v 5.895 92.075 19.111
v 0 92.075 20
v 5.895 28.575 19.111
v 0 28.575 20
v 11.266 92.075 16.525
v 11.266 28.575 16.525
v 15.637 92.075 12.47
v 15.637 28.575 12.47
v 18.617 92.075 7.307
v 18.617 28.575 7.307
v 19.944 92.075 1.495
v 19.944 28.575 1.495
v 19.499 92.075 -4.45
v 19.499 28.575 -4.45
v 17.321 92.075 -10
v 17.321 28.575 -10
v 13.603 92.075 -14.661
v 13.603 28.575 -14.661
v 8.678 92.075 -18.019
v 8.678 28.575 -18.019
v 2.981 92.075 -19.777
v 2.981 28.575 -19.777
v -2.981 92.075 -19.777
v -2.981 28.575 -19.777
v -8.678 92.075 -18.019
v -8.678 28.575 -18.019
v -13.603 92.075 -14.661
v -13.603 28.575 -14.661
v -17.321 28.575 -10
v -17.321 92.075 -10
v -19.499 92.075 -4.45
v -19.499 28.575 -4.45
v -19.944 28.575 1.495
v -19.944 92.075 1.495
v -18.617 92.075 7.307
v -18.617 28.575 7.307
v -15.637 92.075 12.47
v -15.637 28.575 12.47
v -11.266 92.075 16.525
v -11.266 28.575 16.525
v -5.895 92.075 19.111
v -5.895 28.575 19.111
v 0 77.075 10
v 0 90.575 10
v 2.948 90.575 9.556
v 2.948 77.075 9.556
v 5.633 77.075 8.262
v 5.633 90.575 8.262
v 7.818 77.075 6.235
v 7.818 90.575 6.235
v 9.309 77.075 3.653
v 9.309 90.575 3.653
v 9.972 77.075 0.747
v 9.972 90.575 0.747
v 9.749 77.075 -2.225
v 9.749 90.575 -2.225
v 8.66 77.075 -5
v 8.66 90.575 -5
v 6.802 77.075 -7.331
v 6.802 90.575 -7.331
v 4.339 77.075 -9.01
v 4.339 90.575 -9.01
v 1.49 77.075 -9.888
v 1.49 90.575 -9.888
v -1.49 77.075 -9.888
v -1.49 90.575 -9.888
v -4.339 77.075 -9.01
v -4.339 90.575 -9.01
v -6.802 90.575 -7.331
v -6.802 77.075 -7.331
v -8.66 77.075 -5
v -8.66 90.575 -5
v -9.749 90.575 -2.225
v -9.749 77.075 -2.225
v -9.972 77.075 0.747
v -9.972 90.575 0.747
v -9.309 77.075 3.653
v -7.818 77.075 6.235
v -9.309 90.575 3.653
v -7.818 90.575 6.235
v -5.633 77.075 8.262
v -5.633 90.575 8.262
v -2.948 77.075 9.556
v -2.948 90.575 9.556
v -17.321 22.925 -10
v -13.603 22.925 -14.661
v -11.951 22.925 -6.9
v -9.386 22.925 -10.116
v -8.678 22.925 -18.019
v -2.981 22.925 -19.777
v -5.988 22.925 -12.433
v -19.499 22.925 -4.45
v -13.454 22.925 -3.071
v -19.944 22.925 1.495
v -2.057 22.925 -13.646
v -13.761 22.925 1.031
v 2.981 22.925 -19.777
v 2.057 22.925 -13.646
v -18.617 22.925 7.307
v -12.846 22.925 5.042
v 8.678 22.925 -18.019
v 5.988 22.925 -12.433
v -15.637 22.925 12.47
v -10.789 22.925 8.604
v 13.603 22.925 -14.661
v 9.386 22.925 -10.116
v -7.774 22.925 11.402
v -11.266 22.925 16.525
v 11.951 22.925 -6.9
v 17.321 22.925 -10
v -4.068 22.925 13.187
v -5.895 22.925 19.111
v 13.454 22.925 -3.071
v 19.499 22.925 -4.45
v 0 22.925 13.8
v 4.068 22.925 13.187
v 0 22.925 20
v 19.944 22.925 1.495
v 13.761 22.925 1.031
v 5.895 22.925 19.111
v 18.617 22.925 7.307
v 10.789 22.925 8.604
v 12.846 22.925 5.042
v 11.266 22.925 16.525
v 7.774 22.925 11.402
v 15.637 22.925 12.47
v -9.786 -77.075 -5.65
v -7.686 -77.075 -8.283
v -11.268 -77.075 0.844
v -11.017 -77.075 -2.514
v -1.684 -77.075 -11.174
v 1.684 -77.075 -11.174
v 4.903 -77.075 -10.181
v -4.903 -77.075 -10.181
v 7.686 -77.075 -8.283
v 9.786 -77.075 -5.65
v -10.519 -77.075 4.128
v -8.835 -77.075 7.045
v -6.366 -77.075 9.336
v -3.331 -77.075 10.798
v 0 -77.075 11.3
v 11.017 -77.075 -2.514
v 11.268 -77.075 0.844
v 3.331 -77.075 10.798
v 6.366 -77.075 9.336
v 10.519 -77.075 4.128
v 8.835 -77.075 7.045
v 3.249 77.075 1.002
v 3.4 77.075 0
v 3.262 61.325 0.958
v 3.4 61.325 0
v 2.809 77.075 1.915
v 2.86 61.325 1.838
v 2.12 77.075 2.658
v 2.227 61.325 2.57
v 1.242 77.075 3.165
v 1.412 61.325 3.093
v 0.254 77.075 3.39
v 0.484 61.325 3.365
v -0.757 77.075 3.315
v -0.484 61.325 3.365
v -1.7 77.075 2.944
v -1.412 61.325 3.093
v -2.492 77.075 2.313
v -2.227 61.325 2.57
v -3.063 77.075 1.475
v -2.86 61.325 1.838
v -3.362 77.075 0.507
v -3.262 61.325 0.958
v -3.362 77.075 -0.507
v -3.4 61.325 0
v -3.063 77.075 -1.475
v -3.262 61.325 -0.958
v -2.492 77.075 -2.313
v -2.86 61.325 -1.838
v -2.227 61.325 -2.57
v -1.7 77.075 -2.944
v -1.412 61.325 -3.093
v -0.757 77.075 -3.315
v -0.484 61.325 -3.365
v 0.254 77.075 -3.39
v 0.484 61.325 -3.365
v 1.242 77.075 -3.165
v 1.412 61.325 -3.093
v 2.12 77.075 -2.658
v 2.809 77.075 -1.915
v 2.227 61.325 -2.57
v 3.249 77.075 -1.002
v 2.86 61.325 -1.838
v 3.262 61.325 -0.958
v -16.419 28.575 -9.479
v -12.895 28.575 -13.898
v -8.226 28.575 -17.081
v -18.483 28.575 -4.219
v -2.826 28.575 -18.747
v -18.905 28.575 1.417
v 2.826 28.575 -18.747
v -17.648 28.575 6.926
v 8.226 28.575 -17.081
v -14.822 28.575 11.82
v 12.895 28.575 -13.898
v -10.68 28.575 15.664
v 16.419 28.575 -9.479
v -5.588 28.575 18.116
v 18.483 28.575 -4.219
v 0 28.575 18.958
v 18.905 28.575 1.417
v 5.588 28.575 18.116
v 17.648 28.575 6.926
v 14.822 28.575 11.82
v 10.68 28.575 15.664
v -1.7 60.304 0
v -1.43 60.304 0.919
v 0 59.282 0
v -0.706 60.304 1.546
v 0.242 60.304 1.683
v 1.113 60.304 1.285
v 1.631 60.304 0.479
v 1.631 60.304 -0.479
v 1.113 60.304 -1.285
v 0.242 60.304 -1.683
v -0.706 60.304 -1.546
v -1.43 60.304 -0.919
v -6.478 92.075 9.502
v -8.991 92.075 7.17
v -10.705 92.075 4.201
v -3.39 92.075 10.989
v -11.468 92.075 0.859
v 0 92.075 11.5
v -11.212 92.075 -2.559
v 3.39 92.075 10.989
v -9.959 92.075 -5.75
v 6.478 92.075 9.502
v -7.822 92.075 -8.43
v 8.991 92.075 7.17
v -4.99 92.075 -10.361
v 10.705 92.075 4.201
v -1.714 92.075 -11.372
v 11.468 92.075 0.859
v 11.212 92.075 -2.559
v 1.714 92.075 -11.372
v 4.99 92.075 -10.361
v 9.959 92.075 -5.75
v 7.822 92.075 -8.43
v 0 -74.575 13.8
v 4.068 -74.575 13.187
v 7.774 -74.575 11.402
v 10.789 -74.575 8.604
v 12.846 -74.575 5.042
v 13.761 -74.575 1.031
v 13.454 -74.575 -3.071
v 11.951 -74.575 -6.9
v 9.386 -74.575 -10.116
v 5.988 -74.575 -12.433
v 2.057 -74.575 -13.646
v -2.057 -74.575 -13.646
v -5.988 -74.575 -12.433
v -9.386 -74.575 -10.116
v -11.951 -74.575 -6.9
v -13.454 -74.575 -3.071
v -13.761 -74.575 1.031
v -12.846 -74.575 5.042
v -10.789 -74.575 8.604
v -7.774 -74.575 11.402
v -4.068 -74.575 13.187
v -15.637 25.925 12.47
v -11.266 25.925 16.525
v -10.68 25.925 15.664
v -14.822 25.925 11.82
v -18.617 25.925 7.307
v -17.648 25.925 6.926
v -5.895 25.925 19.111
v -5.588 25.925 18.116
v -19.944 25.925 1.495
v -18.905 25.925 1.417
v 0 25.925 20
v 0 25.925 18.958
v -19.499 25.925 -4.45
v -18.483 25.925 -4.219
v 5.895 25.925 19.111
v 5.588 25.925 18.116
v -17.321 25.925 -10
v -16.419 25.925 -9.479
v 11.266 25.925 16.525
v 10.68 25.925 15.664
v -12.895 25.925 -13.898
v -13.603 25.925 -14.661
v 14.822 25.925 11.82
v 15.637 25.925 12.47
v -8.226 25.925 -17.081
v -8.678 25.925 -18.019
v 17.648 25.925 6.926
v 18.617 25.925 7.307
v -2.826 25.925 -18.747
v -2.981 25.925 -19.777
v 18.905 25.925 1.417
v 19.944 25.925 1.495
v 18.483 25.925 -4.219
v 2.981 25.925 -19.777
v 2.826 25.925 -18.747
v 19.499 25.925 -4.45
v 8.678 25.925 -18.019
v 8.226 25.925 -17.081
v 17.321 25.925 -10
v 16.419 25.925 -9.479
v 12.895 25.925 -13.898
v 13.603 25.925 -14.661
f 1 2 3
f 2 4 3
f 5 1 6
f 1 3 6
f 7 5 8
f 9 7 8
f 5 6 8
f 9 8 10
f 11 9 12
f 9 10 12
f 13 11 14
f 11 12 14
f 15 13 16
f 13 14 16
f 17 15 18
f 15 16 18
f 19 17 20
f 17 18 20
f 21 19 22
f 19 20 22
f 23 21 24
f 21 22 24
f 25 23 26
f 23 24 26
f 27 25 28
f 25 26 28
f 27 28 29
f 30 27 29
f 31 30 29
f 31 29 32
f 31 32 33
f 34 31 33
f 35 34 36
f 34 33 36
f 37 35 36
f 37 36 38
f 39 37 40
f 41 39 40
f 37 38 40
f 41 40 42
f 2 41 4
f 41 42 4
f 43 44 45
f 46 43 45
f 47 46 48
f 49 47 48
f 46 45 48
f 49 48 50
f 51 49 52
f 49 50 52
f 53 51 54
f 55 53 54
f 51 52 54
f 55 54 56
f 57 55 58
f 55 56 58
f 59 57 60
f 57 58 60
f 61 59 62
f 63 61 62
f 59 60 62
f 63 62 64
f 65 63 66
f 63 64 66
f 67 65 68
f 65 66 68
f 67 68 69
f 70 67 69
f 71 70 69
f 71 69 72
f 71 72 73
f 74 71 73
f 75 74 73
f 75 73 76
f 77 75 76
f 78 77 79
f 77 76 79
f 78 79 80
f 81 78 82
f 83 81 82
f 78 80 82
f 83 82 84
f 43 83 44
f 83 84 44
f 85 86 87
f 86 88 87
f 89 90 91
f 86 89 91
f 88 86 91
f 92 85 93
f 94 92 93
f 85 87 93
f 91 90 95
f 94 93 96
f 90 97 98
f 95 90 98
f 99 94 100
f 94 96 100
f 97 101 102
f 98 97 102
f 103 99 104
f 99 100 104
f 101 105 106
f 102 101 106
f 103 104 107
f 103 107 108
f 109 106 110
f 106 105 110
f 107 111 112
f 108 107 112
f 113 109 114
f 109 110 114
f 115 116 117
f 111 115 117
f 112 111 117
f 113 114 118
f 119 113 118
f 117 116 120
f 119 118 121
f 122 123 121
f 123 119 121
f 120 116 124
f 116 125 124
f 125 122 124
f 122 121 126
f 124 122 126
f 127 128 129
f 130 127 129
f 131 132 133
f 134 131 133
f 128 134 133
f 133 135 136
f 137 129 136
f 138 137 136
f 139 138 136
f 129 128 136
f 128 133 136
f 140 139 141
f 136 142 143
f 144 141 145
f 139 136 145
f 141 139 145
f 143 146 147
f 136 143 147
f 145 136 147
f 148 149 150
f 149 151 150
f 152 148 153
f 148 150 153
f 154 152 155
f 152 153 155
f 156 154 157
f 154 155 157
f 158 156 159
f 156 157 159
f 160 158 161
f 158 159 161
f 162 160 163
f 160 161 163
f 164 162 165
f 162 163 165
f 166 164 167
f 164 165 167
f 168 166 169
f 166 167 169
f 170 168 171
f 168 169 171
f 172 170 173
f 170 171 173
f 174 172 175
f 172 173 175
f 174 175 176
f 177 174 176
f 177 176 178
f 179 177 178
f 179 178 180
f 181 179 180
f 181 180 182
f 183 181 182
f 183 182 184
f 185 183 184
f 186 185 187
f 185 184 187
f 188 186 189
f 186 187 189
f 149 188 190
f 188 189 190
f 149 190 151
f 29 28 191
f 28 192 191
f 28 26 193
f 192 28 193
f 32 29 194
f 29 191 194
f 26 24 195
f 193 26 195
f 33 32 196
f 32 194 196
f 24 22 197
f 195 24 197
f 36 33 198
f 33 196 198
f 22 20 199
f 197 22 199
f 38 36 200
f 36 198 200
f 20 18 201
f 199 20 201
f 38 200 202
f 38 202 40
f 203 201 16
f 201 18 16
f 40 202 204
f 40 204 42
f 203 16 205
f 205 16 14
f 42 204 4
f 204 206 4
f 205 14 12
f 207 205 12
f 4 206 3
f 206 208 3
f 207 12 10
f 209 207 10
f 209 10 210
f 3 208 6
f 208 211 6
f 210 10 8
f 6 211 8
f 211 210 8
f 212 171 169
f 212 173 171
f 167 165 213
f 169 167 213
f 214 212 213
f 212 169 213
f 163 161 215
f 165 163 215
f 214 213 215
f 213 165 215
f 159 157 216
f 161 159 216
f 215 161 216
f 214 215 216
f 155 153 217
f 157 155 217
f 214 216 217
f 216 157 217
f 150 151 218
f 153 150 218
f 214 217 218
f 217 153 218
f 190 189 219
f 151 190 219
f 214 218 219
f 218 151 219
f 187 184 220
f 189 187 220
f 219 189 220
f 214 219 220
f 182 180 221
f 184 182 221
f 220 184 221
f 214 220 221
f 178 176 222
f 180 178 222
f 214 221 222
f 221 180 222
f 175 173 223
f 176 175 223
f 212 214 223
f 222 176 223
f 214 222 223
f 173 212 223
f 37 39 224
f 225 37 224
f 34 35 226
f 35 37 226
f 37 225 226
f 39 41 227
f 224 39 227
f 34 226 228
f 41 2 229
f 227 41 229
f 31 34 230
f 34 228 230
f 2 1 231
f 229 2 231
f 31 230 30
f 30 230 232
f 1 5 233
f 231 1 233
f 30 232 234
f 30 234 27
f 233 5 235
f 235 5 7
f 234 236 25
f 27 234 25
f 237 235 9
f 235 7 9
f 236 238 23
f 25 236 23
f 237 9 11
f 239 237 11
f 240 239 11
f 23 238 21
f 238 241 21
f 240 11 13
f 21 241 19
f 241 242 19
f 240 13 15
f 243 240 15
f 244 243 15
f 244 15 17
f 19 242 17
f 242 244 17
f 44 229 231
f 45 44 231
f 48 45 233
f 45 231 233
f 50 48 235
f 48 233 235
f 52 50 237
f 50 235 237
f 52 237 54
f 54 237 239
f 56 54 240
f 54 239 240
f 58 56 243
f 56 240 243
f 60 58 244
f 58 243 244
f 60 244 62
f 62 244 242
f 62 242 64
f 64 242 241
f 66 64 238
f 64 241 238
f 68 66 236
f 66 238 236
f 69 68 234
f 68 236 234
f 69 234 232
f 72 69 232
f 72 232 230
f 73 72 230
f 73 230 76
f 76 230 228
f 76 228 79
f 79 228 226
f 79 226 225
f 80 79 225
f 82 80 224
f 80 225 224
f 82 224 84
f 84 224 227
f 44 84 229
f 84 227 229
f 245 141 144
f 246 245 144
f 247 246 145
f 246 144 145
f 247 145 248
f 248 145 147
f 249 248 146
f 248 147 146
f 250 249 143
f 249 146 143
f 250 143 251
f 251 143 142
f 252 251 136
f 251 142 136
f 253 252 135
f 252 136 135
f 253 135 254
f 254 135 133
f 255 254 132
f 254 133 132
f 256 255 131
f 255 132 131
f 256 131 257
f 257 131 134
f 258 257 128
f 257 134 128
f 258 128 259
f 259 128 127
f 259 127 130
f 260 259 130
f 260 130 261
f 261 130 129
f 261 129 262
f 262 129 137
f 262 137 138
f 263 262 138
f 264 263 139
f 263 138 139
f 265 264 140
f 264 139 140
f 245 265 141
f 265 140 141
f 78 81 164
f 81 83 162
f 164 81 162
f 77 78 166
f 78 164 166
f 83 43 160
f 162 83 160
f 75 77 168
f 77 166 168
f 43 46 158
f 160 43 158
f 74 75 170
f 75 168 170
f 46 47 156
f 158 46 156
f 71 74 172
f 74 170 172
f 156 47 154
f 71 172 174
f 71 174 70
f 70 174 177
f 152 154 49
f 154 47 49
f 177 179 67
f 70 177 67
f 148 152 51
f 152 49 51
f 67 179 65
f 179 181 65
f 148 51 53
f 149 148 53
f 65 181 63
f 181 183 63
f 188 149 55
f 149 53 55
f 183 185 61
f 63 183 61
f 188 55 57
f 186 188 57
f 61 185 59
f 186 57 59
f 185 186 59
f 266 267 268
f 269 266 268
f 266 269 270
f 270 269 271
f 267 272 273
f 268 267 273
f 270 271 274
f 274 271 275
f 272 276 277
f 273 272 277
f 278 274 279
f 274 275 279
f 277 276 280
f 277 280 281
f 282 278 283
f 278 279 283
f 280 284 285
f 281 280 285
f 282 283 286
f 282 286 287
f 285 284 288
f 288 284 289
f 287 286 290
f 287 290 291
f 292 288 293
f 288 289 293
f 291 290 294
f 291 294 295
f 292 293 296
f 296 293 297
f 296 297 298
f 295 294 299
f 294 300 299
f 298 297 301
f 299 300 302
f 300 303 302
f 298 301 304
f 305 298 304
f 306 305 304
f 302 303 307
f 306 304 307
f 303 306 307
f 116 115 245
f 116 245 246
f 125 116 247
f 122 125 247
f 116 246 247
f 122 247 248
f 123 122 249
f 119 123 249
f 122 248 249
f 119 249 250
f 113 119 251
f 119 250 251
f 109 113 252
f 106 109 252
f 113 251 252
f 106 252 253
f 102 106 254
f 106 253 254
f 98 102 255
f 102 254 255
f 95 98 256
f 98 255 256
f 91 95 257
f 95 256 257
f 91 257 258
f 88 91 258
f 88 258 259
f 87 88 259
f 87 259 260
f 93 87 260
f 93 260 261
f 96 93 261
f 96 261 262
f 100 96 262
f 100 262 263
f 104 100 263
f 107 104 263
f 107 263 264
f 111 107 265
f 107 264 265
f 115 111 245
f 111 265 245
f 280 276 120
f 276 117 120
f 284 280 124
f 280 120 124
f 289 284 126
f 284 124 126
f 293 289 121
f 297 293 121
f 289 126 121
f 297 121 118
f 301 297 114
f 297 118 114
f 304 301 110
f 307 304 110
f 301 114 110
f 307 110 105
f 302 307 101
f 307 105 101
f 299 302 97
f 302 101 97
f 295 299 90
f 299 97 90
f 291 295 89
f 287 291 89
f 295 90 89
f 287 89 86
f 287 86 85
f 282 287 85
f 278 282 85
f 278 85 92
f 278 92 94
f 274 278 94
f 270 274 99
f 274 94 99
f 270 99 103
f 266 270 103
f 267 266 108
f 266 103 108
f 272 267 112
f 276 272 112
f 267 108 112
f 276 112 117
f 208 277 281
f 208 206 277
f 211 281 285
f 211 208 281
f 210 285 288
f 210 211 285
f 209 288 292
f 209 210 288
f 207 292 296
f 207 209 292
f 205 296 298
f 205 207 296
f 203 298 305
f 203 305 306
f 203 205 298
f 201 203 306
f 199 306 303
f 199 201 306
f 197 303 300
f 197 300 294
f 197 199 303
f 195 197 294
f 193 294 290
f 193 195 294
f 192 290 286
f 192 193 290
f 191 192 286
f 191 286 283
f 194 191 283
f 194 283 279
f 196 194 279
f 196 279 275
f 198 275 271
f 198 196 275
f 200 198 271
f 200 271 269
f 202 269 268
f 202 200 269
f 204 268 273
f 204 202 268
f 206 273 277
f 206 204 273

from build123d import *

# Parameters (mm, degrees)
F0_W     = 2.65
F0_H     = 18.9585
F2_SIZE2 = 1.5
F2_SIZE  = 1.5
F4_D     = 6.8
F4_DEPTH = 15.75
F4_TIP   = 2.0429261047
F5_SIZE2 = 2.5
F5_SIZE  = 2.5


with BuildPart() as f1:
    # F0 (on Right) → F1 (revolve)
    with BuildSketch(Plane.YZ):
        Polygon((-77.075, 13.8), (-77.075, 0), (25.925, 0), (25.925, 18.9585), (25.925, 20), (22.925, 20), (22.925, 13.8), align=None)
        with Locations((27.25, 9.47925)):
            Rectangle(F0_W, F0_H)
        Polygon((28.575, 18.9585), (28.575, 0), (77.075, 0), (77.075, 10), (92.075, 10), (92.075, 20), (28.575, 20), align=None)
    revolve(axis=Axis((0, 0, 0), (0, 1, 0)))

    # F2
    f2_edges = [f1.edges().sort_by_distance(p)[0] for p in [
        (0, 92.075, -10),
    ]]
    chamfer(f2_edges, length=F2_SIZE, length2=F2_SIZE2)

    # F4
    with Locations(Plane(origin=(0, 77.075, 0), x_dir=(-1, 0, 0), z_dir=(0, 1, 0))):
        with Locations((0, 0)):
            Hole(F4_D / 2, depth=F4_DEPTH)
            with Locations((0, 0, -(F4_DEPTH + F4_TIP / 2))):  # 118° drill point
                Cone(0, F4_D / 2, F4_TIP, mode=Mode.SUBTRACT)

    # F5
    f5_edges = [f1.edges().sort_by_distance(p)[0] for p in [
        (0, -77.075, -13.8),
    ]]
    chamfer(f5_edges, length=F5_SIZE, length2=F5_SIZE2)


solid = f1.part
